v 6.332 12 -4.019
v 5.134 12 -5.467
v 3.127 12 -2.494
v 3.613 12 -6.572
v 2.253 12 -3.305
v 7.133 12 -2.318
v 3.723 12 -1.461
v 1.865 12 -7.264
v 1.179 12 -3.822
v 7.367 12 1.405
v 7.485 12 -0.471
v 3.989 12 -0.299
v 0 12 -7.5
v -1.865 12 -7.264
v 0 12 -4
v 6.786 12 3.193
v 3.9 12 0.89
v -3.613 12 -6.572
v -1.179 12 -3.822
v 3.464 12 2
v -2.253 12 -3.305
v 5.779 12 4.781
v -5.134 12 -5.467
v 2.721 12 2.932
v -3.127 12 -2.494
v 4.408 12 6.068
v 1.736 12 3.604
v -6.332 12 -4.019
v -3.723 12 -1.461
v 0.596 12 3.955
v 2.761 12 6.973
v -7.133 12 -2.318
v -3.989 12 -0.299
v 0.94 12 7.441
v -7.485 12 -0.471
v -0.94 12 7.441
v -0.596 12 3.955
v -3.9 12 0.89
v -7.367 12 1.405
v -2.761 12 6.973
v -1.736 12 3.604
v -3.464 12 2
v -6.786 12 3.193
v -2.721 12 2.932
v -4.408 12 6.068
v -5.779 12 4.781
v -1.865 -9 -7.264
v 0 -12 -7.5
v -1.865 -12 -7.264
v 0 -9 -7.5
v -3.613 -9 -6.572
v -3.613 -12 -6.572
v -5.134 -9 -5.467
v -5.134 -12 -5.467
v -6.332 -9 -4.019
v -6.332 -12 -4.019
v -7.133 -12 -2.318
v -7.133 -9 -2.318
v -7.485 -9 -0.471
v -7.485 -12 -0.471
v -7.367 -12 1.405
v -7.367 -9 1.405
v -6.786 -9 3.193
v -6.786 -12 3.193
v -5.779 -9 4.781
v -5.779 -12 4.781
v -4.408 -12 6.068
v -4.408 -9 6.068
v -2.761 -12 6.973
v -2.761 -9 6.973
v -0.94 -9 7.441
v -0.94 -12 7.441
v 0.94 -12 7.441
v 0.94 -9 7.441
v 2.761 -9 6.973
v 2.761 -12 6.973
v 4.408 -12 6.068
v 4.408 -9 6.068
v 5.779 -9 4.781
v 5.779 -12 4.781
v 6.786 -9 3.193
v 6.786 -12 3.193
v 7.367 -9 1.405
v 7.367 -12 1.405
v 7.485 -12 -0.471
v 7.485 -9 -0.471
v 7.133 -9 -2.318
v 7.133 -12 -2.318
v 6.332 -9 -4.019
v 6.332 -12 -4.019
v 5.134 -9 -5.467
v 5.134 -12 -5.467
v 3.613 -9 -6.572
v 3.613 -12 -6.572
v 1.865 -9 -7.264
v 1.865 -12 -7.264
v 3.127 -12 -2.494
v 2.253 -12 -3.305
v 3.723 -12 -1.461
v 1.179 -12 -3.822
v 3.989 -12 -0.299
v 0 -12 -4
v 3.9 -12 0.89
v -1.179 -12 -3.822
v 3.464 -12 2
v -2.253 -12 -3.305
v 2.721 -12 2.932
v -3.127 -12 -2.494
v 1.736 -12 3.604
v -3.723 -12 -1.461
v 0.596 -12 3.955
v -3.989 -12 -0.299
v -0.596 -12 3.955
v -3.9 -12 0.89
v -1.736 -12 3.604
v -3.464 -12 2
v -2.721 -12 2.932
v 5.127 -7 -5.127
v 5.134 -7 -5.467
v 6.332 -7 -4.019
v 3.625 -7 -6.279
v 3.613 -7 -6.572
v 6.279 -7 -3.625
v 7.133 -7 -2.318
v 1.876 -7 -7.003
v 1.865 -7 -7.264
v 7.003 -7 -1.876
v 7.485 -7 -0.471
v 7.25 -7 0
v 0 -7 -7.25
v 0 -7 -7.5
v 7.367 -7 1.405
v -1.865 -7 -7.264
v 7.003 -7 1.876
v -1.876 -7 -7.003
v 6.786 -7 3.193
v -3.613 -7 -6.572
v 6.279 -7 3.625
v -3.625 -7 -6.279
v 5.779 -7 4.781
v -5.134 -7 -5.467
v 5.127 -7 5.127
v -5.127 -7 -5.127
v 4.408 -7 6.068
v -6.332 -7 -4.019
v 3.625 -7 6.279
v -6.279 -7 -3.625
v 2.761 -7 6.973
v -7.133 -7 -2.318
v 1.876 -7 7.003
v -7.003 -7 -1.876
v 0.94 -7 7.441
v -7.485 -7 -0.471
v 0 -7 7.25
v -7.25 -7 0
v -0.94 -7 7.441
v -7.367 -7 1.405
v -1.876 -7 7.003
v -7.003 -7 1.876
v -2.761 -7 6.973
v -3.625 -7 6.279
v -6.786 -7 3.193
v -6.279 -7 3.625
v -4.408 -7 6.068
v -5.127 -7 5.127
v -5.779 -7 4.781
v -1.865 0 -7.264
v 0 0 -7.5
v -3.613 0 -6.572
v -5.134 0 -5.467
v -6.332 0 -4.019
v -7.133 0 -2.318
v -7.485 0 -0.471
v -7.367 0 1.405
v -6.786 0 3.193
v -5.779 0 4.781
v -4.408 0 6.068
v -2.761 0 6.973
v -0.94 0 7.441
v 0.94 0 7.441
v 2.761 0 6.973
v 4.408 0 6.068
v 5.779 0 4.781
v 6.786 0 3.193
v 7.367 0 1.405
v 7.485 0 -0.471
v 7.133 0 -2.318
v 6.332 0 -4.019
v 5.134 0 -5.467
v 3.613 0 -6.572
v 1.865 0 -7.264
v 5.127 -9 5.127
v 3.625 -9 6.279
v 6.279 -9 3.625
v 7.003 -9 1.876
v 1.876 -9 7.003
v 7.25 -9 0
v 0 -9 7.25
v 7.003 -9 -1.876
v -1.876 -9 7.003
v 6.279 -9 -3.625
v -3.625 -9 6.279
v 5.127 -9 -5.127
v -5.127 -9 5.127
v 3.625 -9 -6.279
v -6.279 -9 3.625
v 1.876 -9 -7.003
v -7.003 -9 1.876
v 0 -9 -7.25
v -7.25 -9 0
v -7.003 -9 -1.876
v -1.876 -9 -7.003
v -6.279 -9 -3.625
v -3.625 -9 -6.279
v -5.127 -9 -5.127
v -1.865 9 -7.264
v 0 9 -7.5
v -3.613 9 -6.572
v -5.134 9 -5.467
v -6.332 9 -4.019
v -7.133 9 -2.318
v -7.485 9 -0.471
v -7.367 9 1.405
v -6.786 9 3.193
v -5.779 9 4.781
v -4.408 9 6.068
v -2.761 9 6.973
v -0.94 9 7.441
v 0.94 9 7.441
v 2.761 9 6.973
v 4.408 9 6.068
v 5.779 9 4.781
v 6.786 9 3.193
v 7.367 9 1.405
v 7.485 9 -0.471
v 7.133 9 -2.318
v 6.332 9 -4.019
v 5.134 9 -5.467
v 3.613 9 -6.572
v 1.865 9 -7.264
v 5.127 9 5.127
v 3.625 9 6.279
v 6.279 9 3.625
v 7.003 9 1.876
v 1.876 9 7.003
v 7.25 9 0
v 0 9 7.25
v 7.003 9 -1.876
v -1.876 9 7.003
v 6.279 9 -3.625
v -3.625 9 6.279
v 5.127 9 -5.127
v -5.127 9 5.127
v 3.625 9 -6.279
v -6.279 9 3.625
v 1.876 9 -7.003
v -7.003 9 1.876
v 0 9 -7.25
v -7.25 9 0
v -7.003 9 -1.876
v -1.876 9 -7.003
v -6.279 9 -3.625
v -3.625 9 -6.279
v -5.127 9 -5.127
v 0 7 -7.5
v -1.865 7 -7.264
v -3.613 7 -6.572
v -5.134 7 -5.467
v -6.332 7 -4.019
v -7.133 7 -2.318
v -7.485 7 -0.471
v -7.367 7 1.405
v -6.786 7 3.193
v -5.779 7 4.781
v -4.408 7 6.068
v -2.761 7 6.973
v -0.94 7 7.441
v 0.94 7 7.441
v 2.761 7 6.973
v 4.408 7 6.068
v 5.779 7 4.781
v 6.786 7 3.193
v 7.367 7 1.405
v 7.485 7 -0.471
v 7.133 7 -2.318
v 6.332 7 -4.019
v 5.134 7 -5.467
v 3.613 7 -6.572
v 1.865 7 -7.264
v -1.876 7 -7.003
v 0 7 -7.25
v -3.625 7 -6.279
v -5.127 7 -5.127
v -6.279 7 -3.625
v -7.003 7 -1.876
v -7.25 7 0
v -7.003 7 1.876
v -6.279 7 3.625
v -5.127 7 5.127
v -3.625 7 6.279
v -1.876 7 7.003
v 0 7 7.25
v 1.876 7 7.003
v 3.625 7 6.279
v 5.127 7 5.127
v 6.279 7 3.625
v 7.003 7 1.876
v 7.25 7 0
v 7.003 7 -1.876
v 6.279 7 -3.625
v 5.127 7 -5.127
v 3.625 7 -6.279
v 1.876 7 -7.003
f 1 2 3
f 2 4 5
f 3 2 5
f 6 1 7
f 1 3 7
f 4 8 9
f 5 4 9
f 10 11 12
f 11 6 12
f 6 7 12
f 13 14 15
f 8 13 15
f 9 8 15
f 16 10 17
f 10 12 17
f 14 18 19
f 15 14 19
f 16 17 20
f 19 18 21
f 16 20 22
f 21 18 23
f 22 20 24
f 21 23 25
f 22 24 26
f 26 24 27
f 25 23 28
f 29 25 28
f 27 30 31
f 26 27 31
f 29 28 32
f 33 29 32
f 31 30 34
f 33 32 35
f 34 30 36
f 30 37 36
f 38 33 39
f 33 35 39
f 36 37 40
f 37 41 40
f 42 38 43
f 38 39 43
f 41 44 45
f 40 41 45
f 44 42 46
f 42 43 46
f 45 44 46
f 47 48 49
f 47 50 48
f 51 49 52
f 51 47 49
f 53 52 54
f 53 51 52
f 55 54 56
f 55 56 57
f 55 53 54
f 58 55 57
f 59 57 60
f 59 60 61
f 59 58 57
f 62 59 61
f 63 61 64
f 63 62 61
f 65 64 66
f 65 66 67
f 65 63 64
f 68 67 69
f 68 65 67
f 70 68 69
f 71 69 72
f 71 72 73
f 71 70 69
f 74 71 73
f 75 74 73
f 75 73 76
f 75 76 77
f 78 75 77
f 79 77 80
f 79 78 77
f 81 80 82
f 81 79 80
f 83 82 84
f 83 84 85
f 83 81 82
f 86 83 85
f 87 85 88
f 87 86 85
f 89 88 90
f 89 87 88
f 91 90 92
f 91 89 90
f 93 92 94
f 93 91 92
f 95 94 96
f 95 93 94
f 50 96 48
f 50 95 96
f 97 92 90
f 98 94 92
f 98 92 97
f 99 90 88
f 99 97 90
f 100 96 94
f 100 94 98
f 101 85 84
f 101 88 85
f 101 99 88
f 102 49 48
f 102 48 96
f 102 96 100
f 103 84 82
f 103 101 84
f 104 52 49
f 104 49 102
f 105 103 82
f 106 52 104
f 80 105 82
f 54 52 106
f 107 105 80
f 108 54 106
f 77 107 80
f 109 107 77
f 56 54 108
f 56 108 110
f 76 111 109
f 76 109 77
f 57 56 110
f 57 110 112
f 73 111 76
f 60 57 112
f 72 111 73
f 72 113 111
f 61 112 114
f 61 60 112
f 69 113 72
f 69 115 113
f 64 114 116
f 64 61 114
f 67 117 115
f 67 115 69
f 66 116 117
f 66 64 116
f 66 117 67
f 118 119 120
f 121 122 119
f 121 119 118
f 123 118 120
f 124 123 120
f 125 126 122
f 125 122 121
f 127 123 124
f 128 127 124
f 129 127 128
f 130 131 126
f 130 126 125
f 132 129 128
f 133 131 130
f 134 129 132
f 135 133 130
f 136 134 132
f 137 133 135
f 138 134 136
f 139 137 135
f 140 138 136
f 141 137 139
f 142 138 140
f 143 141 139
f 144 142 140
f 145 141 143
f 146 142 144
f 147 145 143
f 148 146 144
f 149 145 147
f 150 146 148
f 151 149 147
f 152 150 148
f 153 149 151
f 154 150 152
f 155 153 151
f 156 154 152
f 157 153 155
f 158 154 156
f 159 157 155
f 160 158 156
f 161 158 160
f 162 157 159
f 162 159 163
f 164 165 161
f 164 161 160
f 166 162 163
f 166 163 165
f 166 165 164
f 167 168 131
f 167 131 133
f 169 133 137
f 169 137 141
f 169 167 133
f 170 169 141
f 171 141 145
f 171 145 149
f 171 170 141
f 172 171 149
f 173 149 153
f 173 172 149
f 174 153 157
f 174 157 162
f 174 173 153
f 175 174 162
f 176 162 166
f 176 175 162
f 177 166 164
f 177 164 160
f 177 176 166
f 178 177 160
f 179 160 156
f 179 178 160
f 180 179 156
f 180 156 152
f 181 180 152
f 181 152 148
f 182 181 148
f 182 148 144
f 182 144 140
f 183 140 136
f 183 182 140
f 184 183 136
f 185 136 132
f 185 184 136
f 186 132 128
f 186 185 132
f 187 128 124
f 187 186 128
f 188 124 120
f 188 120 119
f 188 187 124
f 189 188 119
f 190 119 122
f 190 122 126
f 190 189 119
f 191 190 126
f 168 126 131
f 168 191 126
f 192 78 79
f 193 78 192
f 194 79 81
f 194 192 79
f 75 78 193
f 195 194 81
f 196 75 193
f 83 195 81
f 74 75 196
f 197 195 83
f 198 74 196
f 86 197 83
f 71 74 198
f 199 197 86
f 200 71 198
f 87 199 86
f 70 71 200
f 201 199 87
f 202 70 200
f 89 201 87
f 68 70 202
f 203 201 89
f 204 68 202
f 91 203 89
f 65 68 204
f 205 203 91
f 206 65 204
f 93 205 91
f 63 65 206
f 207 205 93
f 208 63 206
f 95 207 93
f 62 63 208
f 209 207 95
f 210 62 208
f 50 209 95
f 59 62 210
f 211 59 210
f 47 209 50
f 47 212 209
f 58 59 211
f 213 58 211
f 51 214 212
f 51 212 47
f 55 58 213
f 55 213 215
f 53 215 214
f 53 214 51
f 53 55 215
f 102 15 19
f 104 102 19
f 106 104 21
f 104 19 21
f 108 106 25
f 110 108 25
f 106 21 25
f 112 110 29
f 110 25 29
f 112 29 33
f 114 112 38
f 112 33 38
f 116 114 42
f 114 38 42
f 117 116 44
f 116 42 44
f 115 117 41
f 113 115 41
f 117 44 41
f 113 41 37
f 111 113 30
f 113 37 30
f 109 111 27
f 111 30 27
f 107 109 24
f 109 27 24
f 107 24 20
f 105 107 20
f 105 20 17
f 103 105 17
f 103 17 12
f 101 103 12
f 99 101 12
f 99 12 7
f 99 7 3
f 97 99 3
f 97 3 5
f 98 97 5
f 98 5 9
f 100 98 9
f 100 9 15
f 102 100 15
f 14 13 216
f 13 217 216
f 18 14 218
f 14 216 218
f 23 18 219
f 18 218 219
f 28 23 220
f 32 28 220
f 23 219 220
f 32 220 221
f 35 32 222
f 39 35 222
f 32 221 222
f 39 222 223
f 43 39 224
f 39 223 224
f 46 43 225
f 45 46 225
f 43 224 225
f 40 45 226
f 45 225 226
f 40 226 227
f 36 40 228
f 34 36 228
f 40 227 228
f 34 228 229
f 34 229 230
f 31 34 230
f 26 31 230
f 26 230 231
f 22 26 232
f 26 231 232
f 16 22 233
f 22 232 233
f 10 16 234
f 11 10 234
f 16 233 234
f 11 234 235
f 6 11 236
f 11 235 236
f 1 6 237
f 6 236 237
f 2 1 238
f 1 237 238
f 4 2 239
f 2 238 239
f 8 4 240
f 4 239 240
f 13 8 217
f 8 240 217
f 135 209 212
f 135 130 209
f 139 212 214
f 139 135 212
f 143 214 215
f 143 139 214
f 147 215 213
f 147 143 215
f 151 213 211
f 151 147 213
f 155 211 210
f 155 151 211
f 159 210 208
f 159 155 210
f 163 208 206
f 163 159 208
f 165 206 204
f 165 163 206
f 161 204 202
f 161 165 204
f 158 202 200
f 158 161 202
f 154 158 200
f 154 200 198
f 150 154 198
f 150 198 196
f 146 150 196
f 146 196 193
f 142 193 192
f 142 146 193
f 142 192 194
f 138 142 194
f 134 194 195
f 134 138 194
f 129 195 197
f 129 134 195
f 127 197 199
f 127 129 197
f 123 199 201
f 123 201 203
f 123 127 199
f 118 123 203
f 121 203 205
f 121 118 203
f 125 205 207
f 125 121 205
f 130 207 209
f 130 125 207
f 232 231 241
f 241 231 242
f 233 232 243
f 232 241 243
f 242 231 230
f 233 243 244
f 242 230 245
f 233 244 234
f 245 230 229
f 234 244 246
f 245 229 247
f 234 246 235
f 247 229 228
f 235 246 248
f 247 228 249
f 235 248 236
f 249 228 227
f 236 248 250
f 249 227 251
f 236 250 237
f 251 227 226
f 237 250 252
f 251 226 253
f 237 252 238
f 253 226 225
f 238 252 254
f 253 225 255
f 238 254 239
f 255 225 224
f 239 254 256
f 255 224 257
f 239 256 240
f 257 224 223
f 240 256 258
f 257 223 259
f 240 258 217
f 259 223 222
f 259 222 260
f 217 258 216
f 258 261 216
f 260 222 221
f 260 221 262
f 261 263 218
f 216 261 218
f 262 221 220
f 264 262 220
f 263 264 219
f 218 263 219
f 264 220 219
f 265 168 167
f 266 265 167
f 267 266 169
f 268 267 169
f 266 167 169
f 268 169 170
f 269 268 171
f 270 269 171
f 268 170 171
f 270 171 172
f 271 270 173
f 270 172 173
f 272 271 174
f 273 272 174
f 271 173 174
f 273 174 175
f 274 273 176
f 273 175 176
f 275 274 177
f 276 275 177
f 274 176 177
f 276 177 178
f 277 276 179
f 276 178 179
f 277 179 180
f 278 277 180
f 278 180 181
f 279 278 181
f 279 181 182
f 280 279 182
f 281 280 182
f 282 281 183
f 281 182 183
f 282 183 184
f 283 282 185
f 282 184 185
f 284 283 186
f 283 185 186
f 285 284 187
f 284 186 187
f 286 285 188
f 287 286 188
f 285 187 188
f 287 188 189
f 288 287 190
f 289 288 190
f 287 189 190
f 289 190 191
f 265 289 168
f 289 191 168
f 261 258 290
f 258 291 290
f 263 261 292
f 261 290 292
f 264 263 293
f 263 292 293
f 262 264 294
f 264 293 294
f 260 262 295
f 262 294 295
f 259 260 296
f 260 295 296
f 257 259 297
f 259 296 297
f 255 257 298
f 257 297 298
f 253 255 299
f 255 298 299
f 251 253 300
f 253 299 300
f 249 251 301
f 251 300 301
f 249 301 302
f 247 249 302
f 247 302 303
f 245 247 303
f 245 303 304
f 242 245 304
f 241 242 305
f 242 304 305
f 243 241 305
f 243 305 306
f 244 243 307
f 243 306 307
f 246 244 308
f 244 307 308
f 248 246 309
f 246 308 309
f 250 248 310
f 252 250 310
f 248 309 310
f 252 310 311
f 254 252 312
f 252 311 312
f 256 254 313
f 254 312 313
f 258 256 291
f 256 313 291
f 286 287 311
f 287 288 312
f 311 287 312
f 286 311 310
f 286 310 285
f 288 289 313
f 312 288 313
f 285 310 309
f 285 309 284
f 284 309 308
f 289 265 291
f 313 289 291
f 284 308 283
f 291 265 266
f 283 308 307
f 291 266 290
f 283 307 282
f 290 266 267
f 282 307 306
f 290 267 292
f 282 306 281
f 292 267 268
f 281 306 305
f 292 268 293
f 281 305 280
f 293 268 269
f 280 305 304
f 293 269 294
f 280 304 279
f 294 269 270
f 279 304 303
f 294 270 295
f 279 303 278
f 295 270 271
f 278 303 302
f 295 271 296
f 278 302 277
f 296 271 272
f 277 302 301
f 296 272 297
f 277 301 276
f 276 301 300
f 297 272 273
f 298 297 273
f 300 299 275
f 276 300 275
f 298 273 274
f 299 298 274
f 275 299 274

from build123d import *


with BuildPart() as part:
    # Sketch1 → Revolve1 (revolve)
    with BuildSketch(Plane.XY, mode=Mode.PRIVATE) as revolve1_sk:
        Polygon((4, 0), (4, -12), (7.5, -12), (7.5, -9), (7.25, -9), (7.25, -7), (7.5, -7), (7.5, 0), align=None)
    revolve1 = revolve(revolve1_sk.sketch.rotate(Axis((0, -6.058624222, 0), (0, 1, 0)), 90), axis=Axis((0, -6.058624222, 0), (0, 1, 0)))

    # Mirror1: Revolve1 across plane
    add(revolve1.mirror(Plane.ZX))


solid = part.part
